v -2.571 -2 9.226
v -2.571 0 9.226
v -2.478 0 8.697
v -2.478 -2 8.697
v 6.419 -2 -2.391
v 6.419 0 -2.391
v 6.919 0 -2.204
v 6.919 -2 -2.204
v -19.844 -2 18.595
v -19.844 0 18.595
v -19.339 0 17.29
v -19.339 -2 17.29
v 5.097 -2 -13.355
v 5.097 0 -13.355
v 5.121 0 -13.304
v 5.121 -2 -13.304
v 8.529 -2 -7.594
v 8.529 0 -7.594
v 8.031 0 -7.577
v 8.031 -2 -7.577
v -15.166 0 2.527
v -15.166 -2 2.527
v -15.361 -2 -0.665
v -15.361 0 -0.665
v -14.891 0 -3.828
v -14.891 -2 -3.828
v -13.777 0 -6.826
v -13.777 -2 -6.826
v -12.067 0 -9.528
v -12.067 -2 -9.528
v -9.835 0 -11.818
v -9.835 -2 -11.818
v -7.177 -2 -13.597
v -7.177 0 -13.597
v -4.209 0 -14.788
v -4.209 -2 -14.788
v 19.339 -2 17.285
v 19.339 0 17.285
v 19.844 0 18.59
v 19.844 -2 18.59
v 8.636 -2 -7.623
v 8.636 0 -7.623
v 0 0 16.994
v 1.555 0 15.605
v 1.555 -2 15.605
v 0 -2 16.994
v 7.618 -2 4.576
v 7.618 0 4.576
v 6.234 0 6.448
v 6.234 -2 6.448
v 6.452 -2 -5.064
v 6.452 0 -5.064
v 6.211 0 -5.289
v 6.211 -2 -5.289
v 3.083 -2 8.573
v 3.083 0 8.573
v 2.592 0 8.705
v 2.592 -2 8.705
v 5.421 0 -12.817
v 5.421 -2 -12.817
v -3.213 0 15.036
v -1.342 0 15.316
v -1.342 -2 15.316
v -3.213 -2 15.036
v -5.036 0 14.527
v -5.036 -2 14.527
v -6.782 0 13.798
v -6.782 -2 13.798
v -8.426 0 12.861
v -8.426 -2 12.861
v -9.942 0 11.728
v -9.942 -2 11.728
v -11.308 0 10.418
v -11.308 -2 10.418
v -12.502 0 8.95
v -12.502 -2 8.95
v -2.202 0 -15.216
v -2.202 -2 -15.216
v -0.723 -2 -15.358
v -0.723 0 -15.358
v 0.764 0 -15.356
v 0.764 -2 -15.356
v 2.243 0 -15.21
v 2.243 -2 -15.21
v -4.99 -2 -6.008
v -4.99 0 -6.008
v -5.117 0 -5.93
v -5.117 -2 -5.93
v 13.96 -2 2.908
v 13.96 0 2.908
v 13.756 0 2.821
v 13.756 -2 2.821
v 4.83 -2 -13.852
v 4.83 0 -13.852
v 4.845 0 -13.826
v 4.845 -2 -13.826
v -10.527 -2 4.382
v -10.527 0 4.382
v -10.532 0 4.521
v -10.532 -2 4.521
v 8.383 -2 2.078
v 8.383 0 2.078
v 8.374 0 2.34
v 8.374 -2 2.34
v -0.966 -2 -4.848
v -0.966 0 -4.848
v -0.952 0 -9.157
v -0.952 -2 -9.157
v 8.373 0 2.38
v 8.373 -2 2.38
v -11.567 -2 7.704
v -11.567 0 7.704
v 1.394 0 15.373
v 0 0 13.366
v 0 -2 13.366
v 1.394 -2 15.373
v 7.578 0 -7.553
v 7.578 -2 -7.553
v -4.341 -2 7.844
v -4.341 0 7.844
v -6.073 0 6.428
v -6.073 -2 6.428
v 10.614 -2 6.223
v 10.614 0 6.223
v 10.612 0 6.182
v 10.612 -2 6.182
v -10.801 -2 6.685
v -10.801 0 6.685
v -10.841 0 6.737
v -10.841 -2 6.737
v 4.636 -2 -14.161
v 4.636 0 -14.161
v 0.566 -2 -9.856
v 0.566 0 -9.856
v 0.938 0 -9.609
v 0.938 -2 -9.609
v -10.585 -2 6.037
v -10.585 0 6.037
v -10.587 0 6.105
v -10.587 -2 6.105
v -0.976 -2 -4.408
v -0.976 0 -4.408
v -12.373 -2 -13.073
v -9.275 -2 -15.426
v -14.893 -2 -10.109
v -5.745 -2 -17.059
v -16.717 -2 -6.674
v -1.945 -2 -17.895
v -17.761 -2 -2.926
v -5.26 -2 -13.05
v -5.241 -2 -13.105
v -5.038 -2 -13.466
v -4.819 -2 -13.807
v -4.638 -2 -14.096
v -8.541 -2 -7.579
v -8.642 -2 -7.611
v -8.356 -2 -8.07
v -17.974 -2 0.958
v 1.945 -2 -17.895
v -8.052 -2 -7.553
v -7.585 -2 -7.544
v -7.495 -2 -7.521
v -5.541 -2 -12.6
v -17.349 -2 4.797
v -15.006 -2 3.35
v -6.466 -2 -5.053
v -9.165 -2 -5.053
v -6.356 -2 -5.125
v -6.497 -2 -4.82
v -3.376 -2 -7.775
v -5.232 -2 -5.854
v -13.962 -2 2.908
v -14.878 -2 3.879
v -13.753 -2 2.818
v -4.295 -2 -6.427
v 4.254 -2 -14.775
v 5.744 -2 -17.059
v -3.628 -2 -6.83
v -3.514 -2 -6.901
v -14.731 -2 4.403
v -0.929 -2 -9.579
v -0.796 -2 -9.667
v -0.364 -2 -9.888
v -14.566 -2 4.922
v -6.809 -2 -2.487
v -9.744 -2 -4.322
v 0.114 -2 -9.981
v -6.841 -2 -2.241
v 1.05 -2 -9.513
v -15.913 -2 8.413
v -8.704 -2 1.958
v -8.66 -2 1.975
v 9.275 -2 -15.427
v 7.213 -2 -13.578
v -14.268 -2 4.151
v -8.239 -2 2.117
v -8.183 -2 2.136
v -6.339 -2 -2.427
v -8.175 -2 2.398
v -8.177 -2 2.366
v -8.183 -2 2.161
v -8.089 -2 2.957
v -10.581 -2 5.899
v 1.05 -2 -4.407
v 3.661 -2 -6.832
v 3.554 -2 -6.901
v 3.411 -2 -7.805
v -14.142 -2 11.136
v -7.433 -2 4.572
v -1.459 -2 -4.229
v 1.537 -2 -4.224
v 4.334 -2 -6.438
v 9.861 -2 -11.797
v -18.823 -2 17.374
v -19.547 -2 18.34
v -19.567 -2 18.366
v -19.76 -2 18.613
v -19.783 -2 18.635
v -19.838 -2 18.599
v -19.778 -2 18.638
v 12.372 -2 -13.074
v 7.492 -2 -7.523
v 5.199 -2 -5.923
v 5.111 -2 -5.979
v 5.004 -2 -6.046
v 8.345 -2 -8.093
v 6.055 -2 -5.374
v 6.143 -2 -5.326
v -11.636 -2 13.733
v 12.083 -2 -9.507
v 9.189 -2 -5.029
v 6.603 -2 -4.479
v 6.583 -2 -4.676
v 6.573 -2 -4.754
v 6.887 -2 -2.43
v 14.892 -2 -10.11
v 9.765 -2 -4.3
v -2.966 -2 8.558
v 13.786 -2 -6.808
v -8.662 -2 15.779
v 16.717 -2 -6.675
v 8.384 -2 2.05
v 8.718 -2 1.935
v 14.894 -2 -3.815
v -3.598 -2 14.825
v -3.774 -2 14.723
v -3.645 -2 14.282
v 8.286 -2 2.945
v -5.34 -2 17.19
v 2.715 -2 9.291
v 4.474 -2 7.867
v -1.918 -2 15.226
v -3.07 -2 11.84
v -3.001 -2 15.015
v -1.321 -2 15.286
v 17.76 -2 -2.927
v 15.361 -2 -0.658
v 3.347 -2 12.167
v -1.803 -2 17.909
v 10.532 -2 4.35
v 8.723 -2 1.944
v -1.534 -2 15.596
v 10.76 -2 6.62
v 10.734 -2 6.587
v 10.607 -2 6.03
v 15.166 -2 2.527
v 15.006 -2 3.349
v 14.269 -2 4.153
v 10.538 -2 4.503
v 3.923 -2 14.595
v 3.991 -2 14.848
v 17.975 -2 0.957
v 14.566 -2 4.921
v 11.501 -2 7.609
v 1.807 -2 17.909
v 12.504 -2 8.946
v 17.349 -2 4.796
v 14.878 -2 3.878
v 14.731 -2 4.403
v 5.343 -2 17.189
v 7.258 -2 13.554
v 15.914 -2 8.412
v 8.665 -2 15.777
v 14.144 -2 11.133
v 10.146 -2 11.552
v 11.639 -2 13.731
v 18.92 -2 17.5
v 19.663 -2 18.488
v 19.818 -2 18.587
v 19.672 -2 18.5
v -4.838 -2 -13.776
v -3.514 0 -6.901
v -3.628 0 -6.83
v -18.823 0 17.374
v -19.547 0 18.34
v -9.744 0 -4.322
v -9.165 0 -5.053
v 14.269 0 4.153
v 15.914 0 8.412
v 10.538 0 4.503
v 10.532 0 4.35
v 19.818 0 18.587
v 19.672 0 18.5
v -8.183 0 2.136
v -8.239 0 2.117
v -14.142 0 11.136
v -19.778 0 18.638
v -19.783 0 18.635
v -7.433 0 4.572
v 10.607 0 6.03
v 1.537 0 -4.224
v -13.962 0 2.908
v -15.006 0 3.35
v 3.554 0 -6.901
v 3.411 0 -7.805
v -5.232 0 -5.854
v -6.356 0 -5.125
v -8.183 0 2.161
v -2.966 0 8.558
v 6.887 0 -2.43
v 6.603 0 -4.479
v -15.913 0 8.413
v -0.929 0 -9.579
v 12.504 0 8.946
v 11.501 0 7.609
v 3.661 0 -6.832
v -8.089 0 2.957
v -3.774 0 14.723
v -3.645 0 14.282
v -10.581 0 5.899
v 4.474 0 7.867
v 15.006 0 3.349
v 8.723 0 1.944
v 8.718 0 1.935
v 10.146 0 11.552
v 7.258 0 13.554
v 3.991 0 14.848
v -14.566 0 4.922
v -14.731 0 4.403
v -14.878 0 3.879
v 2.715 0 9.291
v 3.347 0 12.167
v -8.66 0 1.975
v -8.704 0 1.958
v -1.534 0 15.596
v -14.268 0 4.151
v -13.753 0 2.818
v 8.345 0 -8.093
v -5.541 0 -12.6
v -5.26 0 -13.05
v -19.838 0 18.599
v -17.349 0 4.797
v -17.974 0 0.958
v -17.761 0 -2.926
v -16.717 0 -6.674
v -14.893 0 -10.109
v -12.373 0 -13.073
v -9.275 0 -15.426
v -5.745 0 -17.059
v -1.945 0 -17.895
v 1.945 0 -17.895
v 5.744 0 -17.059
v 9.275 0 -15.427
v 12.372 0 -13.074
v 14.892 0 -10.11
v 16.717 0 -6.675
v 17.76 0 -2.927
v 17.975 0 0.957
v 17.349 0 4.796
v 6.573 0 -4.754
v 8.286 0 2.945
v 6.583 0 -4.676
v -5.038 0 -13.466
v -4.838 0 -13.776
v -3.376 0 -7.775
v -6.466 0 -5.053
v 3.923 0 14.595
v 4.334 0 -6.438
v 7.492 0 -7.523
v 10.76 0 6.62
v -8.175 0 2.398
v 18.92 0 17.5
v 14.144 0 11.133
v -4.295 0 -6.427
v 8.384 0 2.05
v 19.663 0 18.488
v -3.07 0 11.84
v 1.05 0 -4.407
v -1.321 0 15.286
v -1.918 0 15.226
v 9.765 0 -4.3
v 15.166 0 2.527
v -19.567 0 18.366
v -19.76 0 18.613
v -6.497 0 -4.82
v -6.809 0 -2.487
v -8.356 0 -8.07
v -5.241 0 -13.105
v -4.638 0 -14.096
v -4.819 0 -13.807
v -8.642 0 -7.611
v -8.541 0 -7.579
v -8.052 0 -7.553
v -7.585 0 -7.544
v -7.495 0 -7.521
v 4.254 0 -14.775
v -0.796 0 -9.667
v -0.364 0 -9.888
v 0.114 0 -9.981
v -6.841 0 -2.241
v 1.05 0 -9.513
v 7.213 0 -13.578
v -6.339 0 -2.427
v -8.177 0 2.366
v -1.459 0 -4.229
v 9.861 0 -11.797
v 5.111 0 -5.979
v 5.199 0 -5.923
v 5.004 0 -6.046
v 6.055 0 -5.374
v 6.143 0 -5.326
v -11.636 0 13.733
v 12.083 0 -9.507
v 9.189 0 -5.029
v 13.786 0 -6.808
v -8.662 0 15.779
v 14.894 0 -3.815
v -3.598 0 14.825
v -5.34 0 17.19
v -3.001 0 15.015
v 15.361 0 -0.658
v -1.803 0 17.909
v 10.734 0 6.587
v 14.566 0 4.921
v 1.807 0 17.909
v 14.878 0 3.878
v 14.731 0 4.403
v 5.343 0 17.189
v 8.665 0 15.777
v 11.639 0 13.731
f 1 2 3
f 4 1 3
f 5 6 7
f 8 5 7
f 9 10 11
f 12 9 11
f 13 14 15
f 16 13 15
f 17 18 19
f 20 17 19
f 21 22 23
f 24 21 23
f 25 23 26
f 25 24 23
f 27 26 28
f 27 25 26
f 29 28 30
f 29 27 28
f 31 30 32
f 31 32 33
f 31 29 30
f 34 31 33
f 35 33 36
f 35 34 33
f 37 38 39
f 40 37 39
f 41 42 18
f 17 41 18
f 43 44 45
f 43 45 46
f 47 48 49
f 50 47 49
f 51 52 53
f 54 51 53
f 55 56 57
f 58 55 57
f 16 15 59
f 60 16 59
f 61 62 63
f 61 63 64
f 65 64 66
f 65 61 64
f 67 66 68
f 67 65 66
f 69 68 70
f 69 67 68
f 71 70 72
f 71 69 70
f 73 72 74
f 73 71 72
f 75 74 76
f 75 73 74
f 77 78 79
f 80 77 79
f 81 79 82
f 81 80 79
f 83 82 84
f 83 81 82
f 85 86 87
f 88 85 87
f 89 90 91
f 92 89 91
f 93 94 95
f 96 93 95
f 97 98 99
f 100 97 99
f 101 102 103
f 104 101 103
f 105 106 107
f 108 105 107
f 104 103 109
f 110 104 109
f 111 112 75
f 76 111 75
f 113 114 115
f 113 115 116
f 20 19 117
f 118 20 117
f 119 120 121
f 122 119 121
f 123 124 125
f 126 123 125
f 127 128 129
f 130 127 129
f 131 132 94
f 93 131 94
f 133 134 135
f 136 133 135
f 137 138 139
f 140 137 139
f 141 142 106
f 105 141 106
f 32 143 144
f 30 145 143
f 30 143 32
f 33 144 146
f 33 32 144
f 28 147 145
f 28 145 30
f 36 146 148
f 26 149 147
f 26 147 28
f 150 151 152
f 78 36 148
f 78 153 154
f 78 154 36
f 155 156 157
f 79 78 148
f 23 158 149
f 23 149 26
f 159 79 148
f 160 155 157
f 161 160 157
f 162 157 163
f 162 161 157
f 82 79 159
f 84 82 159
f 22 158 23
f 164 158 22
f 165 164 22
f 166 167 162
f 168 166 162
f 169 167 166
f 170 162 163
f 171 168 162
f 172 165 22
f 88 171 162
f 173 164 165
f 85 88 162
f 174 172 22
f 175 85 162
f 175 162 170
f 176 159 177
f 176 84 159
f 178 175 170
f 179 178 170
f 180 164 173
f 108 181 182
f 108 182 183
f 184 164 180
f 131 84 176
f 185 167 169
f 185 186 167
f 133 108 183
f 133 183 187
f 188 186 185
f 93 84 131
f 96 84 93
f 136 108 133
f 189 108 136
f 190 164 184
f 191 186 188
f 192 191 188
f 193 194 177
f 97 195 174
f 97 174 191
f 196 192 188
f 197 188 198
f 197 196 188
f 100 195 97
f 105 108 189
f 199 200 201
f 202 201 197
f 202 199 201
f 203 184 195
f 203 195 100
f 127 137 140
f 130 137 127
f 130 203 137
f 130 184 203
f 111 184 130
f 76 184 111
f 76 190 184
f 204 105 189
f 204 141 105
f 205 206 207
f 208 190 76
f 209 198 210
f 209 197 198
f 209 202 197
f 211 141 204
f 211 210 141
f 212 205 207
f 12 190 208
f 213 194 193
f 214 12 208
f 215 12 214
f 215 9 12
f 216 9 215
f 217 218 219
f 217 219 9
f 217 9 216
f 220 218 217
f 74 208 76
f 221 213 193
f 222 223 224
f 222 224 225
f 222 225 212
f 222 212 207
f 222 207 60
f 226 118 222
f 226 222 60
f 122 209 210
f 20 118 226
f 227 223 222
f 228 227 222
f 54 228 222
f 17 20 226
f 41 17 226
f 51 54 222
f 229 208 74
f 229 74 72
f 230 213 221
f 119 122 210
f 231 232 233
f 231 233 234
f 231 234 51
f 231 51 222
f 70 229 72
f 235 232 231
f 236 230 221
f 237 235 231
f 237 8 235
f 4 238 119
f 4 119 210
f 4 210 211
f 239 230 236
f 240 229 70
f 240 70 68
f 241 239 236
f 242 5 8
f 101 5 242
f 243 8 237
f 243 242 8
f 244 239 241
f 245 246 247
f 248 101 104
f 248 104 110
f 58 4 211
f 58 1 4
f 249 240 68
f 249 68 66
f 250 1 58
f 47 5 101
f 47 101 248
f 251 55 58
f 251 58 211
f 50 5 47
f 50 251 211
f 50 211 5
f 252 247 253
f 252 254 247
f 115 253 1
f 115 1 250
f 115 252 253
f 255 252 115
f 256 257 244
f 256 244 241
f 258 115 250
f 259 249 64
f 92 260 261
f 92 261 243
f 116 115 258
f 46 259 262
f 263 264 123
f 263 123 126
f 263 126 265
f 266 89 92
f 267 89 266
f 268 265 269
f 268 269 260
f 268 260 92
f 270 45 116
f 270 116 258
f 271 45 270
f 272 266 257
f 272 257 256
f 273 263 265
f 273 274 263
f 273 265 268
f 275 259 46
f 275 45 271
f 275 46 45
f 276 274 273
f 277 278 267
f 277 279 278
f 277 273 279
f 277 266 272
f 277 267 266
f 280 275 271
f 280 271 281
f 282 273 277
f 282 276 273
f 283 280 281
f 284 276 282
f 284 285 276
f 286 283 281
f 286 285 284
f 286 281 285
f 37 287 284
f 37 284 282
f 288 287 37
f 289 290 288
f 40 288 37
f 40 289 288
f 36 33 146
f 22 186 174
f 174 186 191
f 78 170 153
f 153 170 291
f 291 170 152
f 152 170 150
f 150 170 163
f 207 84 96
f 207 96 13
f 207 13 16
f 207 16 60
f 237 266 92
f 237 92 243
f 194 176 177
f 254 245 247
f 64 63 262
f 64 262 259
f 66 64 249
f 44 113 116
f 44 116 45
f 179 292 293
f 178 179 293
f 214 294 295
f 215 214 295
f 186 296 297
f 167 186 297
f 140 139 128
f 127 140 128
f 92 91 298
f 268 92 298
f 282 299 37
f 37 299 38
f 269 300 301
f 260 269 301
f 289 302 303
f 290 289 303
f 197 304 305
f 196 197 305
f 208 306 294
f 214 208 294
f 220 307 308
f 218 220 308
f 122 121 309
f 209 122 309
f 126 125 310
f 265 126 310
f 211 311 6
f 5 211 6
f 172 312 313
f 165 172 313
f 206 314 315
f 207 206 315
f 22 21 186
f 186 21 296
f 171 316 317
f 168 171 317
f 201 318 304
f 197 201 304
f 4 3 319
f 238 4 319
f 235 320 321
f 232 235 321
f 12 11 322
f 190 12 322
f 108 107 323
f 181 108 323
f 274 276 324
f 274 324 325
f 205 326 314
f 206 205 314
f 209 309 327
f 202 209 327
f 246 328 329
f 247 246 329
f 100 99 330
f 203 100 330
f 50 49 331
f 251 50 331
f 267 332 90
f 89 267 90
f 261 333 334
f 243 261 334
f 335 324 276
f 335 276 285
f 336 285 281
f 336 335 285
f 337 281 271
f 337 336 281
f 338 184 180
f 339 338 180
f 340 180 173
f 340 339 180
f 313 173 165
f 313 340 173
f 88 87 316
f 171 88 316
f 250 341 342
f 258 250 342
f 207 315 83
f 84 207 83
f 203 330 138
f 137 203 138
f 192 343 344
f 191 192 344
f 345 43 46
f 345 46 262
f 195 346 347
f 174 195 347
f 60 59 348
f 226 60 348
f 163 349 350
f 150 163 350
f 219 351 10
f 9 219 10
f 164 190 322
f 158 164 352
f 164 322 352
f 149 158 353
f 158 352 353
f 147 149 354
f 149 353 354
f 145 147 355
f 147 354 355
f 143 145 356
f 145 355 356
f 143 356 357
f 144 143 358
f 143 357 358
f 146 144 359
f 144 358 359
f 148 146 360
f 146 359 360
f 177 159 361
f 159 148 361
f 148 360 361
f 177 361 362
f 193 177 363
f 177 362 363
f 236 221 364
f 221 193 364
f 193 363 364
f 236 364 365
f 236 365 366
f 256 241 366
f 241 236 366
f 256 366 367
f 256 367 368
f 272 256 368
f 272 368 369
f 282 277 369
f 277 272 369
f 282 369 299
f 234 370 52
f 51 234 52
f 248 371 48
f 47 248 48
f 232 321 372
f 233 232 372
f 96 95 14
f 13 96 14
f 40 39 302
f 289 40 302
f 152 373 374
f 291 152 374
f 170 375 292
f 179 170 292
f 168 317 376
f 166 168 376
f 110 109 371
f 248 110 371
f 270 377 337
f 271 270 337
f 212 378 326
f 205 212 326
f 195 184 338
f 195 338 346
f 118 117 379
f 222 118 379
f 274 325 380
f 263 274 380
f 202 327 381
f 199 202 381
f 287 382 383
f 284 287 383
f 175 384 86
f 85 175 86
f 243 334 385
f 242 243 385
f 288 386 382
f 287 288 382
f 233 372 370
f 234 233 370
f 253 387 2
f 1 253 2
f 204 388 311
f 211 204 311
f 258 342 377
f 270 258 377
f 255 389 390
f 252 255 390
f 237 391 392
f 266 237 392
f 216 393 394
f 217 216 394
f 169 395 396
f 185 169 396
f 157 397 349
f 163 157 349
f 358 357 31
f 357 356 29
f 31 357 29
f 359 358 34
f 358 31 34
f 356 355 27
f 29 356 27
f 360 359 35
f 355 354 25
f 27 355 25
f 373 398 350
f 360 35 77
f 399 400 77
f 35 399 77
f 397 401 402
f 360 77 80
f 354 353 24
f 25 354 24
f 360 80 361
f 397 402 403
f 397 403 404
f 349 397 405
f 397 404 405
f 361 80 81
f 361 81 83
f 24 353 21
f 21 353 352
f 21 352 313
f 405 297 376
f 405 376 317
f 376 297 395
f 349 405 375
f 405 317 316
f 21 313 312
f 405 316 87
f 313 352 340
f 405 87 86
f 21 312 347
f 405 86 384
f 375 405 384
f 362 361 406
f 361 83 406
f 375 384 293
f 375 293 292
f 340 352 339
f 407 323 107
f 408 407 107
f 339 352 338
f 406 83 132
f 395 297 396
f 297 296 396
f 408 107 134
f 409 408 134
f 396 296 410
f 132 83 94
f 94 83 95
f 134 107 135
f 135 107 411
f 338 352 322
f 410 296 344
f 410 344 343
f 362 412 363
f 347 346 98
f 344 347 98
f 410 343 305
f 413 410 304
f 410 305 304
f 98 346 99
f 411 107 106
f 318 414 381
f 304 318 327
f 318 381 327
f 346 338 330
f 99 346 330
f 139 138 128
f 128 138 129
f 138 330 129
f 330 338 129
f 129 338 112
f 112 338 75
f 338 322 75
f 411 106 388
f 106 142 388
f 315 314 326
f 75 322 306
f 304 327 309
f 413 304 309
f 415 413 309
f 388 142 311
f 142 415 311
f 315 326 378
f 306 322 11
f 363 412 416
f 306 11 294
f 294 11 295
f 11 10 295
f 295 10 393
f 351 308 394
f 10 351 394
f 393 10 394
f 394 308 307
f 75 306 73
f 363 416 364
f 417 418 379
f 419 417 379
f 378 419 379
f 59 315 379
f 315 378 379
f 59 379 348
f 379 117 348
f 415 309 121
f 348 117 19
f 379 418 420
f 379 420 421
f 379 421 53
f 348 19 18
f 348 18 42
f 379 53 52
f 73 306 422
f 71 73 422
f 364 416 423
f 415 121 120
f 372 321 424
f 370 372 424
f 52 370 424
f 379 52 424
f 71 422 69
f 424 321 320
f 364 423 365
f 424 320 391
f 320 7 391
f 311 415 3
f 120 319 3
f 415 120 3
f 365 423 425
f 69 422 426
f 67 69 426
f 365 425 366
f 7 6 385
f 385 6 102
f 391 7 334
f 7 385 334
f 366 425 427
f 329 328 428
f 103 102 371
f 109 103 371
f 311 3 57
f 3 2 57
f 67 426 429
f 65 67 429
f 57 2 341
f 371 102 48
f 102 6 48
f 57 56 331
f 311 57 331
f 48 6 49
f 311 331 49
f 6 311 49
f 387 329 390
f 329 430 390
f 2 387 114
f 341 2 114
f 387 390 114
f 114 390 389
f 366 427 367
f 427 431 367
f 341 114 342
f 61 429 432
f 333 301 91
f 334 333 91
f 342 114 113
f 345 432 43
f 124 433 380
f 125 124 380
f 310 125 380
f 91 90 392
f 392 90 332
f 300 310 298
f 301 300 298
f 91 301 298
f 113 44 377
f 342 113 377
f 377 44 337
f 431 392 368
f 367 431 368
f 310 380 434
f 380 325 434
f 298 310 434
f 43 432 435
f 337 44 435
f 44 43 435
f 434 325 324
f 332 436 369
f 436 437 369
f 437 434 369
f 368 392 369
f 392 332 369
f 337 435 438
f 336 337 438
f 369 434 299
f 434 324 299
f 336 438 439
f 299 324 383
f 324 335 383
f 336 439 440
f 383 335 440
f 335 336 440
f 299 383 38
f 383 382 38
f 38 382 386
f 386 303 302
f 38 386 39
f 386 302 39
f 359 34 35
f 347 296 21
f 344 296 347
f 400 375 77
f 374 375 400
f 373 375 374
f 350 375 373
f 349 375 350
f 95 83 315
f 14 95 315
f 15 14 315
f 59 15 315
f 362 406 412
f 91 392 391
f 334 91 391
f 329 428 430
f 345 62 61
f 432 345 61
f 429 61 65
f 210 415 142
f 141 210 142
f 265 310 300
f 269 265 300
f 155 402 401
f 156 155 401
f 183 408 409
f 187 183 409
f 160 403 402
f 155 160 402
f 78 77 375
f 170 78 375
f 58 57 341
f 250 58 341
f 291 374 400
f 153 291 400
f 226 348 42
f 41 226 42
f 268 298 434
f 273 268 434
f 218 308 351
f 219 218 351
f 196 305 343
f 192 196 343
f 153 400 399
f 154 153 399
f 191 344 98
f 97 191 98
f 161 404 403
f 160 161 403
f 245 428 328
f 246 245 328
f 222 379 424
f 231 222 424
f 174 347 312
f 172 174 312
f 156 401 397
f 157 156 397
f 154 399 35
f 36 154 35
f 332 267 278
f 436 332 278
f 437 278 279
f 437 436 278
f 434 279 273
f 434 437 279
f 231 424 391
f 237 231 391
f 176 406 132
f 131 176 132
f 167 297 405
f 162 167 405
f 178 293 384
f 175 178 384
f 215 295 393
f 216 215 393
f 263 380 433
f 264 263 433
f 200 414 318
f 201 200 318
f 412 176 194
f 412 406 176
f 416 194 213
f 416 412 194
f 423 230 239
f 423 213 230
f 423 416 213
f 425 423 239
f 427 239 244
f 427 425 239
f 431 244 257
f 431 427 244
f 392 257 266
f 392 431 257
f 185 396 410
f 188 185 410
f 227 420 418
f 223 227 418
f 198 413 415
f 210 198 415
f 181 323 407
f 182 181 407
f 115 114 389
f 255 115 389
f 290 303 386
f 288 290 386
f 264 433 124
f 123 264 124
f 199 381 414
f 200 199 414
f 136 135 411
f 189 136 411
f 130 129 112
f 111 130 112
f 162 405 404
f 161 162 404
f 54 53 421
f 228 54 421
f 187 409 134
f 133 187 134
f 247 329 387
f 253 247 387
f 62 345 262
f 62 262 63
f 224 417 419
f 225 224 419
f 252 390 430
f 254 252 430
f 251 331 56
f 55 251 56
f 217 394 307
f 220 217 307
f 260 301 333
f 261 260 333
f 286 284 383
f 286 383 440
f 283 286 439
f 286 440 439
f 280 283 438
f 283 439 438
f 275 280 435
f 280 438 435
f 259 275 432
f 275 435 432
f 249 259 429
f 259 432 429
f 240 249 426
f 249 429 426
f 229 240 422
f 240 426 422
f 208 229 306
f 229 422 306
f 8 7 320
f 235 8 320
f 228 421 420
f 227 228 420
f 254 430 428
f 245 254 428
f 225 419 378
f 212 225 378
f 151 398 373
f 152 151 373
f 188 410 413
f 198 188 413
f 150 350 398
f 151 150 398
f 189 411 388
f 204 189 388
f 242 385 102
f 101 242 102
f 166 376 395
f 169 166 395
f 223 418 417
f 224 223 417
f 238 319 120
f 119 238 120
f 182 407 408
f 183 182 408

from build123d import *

# Parameters (mm, degrees)
F1_R     = 18
F1_R_2   = 15.375
F2_DEPTH = 2
F3_DEPTH = 2


with BuildPart() as f2:
    # F0 (on Front) + F1 (on Front) → F2 (new body)
    with BuildSketch(Plane.XZ):
        Polygon((-19.759701, 18.612917), (-19.777608, 18.638063), (-19.78312, 18.635015), (-19.838238, 18.599201), (-19.84375, 18.595391), (-19.339382, 17.290085), (-14.268196, 4.150538), (-13.75283, 2.817952), (-13.962278, 2.907538), (-15.865373, 3.71508), (-16.047263, 3.792271), (-16.052775, 3.786734), (-16.102355, 3.723335), (-16.106496, 3.716452), (-15.529103, 2.9861), (-9.7441, -4.321632), (-9.165336, -5.053381), (-7.495159, -7.521448), (-7.584719, -7.543521), (-8.051876, -7.553147), (-8.541055, -7.579309), (-8.64169, -7.611034), (-8.356422, -8.069885), (-5.541086, -12.599518), (-5.259984, -13.050114), (-5.24068, -13.105257), (-5.03809, -13.466293), (-4.838268, -13.77635), (-4.819015, -13.806678), (-4.638472, -14.096086), (-2.836012, -17.000982), (-2.655468, -17.291736), (-1.86309, -17.366158), (-2.00091, -16.493846), (-3.376193, -7.774991), (-3.513988, -6.901307), (-3.62839, -6.829654), (-4.295343, -6.427292), (-4.989855, -6.00837), (-5.116652, -5.929808), (-5.2324, -5.854014), (-6.355512, -5.125034), (-6.465748, -5.053381), (-6.497472, -4.820488), (-6.808902, -2.487473), (-6.840576, -2.240788), (-6.338951, -2.426818), (-1.459332, -4.229303), (-0.975639, -4.408449), (-0.966013, -4.848047), (-0.952221, -9.157183), (-0.928802, -9.578873), (-0.796493, -9.667062), (-0.363779, -9.887534), (0.114376, -9.981235), (0.566395, -9.855835), (0.938454, -9.609176), (1.050087, -9.512706), (1.050087, -4.407078), (1.536522, -4.223791), (6.418834, -2.391004), (6.919214, -2.203577), (6.887464, -2.429612), (6.603492, -4.478757), (6.582918, -4.675784), (6.573266, -4.754347), (6.452108, -5.064404), (6.210808, -5.289017), (6.143244, -5.326228), (6.055106, -5.374462), (5.199355, -5.922924), (5.11114, -5.979439), (5.003648, -6.045581), (4.333951, -6.43829), (3.661435, -6.832422), (3.553943, -6.901307), (3.410661, -7.805293), (1.989887, -16.817696), (1.847952, -17.717541), (2.517673, -17.571466), (2.709215, -17.261408), (4.635703, -14.160856), (4.830013, -13.852169), (4.845202, -13.825957), (5.097348, -13.354685), (5.120792, -13.303707), (5.421198, -12.817246), (8.345424, -8.093304), (8.636254, -7.623404), (8.528558, -7.594498), (8.031226, -7.576566), (7.577836, -7.553147), (7.492492, -7.522845), (9.188704, -5.028565), (9.764776, -4.299585), (15.527782, 2.984729), (16.105124, 3.712337), (16.09979, 3.719195), (16.050006, 3.781222), (16.045688, 3.786734), (15.861284, 3.709568), (13.959586, 2.907538), (13.755624, 2.820746), (14.269466, 4.153306), (19.339306, 17.284751), (19.84375, 18.589549), (19.817588, 18.586755), (19.671538, 18.500141), (19.663156, 18.487695), (18.92046, 17.499635), (11.50112, 7.609383), (10.759694, 6.619977), (10.733532, 6.586906), (10.613644, 6.223102), (10.612374, 6.181776), (10.606786, 6.030189), (10.537952, 4.503318), (10.532364, 4.35036), (8.723122, 1.944319), (8.717534, 1.934642), (8.384032, 2.050415), (8.382508, 2.077974), (8.37438, 2.339797), (8.372856, 2.379777), (8.286242, 2.944749), (7.617714, 4.576343), (6.234176, 6.447739), (4.474489, 7.867193), (3.082671, 8.572551), (2.592095, 8.704885), (2.714727, 9.290609), (3.347263, 12.166651), (3.923284, 14.594637), (4.019728, 14.955825), (3.862629, 15.030247), (2.64447, 15.287803), (1.393957, 15.372972), (0, 13.366205), (-1.320852, 15.286005), (-1.918233, 15.225827), (-3.001366, 15.015007), (-3.598062, 14.824761), (-3.77444, 14.722907), (-3.6449, 14.281963), (-3.07025, 11.840007), (-2.571445, 9.225839), (-2.477694, 8.696757), (-2.965526, 8.557565), (-4.340835, 7.843571), (-6.072988, 6.428435), (-7.433132, 4.572229), (-8.089087, 2.95717), (-8.174533, 2.397658), (-8.177276, 2.365985), (-8.182788, 2.160676), (-8.182788, 2.135835), (-8.239303, 2.116557), (-8.659597, 1.974621), (-8.703691, 1.958061), (-10.526827, 4.382033), (-10.532364, 4.521251), (-10.580573, 5.899252), (-10.584713, 6.037047), (-10.587457, 6.104585), (-10.801071, 6.684823), (-10.841025, 6.737147), (-11.567262, 7.704379), (-18.822619, 17.374413), (-19.547484, 18.340121), (-19.566763, 18.366283), align=None)
    with BuildSketch(Plane.XZ):
        Circle(F1_R)
        Circle(F1_R_2, mode=Mode.SUBTRACT)
    extrude(amount=F2_DEPTH)


with BuildPart() as f3:
    # F0 (on Front) → F3 (new body)
    with BuildSketch(Plane.XZ):
        Polygon((-0.644906, 15.354097), (-1.320852, 15.286005), (0, 13.366205), (1.393957, 15.372972), (1.04455, 15.396769), (0.698678, 15.396769), (0.362407, 15.396769), align=None)
        Polygon((-1.533912, 15.595678), (-1.320852, 15.286005), (-0.644906, 15.354097), (0.362407, 15.396769), (0.698678, 15.396769), (1.04455, 15.396769), (1.393957, 15.372972), (1.555467, 15.605485), (0, 16.993944), align=None)
    extrude(amount=F3_DEPTH)


with BuildPart() as f2_1:
    add(f2.part)

    # F4: cut F3
    add(f3.part, mode=Mode.SUBTRACT)


solid = f2_1.part
